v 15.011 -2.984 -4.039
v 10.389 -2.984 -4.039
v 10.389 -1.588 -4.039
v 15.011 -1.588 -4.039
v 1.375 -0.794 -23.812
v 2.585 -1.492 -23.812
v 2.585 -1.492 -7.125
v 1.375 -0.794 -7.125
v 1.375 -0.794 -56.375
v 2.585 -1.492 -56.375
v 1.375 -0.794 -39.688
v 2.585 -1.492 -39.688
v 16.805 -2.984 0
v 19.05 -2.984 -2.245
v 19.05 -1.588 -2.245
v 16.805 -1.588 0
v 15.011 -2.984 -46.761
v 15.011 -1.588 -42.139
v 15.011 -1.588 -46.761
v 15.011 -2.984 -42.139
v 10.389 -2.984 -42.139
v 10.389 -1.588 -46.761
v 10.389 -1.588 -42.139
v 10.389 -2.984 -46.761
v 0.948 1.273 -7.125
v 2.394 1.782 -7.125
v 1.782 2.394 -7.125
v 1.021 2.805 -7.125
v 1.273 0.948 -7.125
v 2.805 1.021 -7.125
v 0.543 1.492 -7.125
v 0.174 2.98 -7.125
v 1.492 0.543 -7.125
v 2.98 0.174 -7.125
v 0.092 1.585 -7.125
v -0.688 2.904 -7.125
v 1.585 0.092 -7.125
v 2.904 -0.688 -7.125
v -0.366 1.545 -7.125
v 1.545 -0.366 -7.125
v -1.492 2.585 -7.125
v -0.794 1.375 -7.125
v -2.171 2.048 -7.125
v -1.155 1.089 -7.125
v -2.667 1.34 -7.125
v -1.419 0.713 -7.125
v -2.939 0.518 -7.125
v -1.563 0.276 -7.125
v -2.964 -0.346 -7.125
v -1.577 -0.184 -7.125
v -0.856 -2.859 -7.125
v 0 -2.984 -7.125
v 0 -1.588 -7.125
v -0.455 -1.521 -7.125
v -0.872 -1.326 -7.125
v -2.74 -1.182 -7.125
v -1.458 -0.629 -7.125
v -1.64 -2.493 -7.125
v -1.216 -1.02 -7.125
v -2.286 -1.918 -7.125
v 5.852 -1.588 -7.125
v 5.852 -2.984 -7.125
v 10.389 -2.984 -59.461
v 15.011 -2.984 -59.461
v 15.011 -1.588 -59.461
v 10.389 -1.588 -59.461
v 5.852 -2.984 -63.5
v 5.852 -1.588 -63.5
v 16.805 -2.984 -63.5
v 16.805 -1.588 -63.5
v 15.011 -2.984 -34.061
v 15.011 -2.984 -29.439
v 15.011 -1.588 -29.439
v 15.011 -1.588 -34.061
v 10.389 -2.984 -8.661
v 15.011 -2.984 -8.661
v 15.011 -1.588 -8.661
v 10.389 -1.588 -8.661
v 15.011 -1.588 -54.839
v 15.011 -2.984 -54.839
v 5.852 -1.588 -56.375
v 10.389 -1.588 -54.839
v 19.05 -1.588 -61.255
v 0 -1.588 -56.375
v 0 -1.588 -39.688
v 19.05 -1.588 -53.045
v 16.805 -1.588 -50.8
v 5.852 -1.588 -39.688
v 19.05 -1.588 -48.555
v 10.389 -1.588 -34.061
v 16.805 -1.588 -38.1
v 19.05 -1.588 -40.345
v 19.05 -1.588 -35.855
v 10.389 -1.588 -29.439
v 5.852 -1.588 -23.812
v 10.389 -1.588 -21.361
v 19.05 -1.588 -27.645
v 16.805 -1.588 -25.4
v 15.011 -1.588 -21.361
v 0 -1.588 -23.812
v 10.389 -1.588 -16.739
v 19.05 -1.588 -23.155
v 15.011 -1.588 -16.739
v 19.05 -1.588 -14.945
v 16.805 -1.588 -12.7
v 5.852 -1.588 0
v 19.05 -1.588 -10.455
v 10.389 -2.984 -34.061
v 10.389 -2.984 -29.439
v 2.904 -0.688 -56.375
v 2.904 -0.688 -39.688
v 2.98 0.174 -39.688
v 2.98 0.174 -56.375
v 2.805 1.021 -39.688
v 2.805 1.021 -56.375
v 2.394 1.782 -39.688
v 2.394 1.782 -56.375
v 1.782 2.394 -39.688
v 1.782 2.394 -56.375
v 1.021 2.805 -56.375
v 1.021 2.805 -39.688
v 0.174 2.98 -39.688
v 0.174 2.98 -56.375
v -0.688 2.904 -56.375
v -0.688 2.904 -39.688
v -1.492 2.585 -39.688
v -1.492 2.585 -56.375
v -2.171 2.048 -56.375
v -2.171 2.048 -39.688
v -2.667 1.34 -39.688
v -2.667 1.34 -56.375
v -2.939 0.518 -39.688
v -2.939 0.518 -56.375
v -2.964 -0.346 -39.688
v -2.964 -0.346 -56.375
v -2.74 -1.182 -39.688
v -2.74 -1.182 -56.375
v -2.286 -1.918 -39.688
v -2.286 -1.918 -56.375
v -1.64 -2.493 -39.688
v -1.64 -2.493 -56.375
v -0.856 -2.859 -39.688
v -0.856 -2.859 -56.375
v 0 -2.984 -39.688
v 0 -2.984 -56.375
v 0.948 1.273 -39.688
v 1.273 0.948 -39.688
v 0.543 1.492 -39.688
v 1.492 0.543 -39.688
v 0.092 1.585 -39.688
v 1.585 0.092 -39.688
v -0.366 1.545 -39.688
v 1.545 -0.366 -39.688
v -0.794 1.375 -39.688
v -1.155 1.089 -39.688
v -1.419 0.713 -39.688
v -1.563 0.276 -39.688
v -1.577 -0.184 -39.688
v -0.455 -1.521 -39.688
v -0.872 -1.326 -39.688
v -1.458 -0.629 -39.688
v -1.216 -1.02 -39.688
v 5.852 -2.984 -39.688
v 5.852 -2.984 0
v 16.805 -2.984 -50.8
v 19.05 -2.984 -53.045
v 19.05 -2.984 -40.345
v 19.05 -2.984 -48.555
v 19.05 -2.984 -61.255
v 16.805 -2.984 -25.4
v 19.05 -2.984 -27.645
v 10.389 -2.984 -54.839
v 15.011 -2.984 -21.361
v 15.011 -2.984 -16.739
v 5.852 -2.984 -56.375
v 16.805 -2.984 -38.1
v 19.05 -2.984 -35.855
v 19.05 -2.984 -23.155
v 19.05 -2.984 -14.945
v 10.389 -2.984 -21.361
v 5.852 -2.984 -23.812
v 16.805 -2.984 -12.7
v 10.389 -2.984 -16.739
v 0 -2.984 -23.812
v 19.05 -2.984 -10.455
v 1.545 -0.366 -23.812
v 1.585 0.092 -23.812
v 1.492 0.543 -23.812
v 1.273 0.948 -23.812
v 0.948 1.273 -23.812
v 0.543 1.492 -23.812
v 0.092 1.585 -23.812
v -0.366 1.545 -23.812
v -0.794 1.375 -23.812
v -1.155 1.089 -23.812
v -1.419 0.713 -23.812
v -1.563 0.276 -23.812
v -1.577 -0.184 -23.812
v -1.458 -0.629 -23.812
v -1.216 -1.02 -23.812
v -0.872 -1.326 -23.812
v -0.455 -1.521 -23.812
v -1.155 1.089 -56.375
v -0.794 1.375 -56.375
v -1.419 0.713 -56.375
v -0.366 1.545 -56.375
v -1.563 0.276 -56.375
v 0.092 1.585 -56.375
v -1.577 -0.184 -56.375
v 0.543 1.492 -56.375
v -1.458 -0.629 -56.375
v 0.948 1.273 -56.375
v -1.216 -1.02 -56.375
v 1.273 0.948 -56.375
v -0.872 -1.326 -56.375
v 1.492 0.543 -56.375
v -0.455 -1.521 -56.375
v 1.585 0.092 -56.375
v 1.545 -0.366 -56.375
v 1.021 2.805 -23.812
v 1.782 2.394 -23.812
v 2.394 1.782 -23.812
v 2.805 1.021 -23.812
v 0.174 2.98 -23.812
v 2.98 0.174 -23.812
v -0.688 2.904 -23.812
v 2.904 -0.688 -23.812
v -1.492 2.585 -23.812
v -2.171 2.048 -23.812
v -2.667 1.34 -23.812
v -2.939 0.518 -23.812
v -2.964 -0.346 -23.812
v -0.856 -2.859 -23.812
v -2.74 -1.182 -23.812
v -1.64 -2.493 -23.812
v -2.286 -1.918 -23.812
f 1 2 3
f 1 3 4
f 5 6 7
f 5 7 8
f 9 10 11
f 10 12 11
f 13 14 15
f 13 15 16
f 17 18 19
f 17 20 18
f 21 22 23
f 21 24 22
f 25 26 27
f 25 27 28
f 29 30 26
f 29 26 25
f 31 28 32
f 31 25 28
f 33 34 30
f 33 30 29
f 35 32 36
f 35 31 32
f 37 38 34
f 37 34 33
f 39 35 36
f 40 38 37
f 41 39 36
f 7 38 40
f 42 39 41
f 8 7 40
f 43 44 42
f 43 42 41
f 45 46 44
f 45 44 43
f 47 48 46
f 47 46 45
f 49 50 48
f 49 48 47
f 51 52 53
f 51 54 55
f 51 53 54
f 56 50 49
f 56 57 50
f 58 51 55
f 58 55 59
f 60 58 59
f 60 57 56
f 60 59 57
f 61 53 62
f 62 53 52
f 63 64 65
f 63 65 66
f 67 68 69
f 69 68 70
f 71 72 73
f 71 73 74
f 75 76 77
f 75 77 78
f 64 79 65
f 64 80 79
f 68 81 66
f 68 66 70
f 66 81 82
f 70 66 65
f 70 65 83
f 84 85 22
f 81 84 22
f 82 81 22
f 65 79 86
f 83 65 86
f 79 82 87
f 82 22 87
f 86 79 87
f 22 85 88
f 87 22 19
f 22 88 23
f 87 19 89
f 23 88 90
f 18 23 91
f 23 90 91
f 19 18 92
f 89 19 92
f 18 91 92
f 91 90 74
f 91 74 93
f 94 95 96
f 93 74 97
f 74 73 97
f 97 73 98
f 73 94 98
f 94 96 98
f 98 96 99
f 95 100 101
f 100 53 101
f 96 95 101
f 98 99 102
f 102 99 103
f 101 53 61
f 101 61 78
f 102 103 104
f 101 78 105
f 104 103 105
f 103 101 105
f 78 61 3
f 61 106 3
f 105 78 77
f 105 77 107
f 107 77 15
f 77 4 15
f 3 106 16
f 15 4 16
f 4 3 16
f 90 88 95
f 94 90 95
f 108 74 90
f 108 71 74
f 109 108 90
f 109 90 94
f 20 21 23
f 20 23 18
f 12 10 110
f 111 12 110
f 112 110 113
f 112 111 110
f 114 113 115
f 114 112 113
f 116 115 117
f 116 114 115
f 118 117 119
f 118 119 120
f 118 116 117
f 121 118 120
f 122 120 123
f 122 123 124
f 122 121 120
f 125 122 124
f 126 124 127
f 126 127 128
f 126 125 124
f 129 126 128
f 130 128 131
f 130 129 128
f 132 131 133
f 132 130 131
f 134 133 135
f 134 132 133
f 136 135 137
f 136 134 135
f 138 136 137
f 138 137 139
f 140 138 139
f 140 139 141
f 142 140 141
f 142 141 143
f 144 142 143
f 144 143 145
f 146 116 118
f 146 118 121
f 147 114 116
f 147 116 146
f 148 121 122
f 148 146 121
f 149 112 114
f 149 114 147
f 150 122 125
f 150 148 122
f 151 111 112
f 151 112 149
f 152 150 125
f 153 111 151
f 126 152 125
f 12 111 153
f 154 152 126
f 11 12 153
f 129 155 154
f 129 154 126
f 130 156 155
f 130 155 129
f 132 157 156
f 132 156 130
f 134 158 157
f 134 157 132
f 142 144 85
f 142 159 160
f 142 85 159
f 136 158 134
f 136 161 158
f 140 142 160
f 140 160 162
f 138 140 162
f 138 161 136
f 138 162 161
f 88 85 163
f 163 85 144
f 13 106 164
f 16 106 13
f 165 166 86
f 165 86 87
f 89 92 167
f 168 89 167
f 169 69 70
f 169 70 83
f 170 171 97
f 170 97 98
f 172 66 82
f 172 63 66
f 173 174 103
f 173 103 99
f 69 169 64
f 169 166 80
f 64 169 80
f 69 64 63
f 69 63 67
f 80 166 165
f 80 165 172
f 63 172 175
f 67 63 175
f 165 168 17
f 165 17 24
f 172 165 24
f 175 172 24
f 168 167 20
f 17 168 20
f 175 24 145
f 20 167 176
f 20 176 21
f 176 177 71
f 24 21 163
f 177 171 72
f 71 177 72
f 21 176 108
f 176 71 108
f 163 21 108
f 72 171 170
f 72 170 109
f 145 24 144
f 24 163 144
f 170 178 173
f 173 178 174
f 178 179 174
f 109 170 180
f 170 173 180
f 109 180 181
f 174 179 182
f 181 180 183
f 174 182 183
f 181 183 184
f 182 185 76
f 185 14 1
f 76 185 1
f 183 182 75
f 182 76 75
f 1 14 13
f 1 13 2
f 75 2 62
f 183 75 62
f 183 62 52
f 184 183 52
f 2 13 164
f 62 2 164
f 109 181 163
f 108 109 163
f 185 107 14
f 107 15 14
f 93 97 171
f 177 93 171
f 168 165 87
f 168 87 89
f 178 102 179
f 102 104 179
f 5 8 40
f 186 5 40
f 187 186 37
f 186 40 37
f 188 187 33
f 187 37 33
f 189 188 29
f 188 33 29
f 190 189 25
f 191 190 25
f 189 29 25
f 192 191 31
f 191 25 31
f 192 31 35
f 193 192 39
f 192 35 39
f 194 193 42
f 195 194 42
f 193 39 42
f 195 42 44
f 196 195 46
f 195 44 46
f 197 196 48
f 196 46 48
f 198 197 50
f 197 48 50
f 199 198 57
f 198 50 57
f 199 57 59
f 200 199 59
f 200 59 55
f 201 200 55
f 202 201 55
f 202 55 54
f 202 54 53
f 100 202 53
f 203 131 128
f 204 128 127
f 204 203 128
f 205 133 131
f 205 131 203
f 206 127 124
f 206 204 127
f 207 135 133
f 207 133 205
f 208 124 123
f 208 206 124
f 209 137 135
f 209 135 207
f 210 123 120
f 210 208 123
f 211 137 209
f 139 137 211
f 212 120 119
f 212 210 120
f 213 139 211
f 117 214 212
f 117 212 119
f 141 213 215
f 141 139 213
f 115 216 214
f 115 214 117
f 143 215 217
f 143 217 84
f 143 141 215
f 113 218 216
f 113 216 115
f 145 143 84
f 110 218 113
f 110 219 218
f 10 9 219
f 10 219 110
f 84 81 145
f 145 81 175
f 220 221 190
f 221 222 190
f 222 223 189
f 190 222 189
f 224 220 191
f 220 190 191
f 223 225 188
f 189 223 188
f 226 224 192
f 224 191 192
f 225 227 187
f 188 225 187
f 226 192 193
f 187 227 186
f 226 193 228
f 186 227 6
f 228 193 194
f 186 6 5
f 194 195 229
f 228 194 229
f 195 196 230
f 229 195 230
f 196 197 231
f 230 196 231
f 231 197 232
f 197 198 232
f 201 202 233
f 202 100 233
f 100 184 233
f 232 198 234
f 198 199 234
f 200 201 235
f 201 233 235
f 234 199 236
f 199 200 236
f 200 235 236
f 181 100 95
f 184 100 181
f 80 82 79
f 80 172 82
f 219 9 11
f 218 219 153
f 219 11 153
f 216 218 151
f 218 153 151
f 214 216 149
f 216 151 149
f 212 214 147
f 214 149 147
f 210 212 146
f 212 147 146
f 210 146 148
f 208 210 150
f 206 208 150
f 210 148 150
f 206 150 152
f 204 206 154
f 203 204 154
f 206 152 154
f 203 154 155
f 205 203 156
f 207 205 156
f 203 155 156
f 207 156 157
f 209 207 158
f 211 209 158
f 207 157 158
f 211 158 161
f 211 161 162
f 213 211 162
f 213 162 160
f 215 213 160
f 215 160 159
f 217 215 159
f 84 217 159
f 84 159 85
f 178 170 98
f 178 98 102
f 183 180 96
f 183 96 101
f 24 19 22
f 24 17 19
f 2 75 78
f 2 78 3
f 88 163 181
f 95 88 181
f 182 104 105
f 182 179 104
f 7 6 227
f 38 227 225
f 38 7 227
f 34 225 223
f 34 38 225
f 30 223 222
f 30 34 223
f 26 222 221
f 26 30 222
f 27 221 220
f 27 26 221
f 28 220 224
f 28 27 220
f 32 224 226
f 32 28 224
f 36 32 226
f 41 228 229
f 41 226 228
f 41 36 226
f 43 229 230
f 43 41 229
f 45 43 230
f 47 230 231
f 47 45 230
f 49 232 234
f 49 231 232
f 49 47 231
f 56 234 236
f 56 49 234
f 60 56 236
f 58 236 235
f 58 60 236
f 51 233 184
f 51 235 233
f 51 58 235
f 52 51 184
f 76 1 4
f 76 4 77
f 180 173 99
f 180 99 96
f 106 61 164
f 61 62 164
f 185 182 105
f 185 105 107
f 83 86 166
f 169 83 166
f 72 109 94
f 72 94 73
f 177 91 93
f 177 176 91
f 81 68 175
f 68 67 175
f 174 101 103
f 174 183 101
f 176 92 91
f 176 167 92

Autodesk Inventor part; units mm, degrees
ref_plane "YZ Plane" through (0, 0, 0) normal (1, 0, 0) x (0, 1, 0)
ref_plane "XZ Plane" through (0, 0, 0) normal (0, 1, 0) x (-1, 0, 0)
ref_plane "XY Plane" through (0, 0, 0) normal (0, 0, 1) x (1, 0, 0)
sketch "Sketch1" plane through (0, 0, 0) normal (0, 0, 1) x (1, 0, 0)
  line L0 (2.5847, -1.4923) -> (1.3748, -0.7938)
  arc A0 (2.5847, -1.4923) -> (0, -2.9845) centre (0, 0) ccw
  arc A1 (1.3748, -0.7938) -> (0, -1.5875) centre (0, 0) ccw
  arc A2 (1.3748, -0.7938) -> (0, -1.5875) centre (0, 0) ccw
  line L1 (0, -1.5875) -> (16.8049, -1.5875)
  line L2 (16.8049, -2.9845) -> (0, -2.9845)
  arc A3 (2.5847, -1.4923) -> (0, -2.9845) centre (0, 0) ccw
  line L3 (2.5847, -1.4923) -> (1.3748, -0.7938)
  line L4 (19.05, -1.5875) -> (16.8049, -1.5875)
  line L5 (19.05, -2.9845) -> (16.8049, -2.9845)
  line L6 (19.05, -1.5875) -> (19.05, -2.9845)
  point P0 (0, 0)
  point P1 (15.875, -2.9845)
extrude "Extrusion1" add sketch "Sketch1" against normal blind 63.5
sketch "Sketch2" plane through (0, -2.9845, 0) normal (0, -1, 0) x (1, 0, 0)
  line L0 (19.05, -23.1549) -> (19.05, -14.9451)
  line L1 (19.05, -14.9451) -> (16.8049, -12.7)
  line L2 (16.8049, -12.7) -> (19.05, -10.4549)
  line L3 (19.05, -10.4549) -> (19.05, -2.2451)
  line L4 (19.05, -2.2451) -> (16.8049, 0)
  line L5 (-2.9845, 0) -> (16.8049, 0)
  line L6 (0, -7.1247) -> (0, 0)
  line L7 (5.8525, -7.1247) -> (-2.9845, -7.1247)
  line L8 (5.8525, -39.6875) -> (5.8525, 0)
  line L9 (5.8525, -23.8125) -> (-2.9845, -23.8125)
  line L10 (0, -39.6875) -> (0, -23.8125)
  line L11 (5.8525, -39.6875) -> (-2.9845, -39.6875)
  line L12 (5.8525, -63.5) -> (5.8525, -39.6875)
  line L13 (-2.9845, -56.3753) -> (5.8525, -56.3753)
  line L14 (0, -63.5) -> (0, -56.3753)
  line L15 (16.8049, -63.5) -> (-2.9845, -63.5)
  line L16 (16.8049, -63.5) -> (19.05, -61.2549)
  line L17 (19.05, -61.2549) -> (19.05, -53.0451)
  line L18 (19.05, -53.0451) -> (16.8049, -50.8)
  line L19 (16.8049, -50.8) -> (19.05, -48.5549)
  line L20 (19.05, -48.5549) -> (19.05, -40.3451)
  line L21 (19.05, -40.3451) -> (16.8049, -38.1)
  line L22 (16.8049, -38.1) -> (19.05, -35.8549)
  line L23 (19.05, -35.8549) -> (19.05, -27.6451)
  line L24 (19.05, -27.6451) -> (16.8049, -25.4)
  line L25 (16.8049, -25.4) -> (19.05, -23.1549)
  line L26 (15.0114, -42.1386) -> (15.0114, -46.7614)
  line L27 (15.0114, -46.7614) -> (10.3886, -46.7614)
  line L28 (10.3886, -46.7614) -> (10.3886, -42.1386)
  line L29 (10.3886, -42.1386) -> (15.0114, -42.1386)
  line L30 (15.0114, -29.4386) -> (15.0114, -34.0614)
  line L31 (15.0114, -34.0614) -> (10.3886, -34.0614)
  line L32 (10.3886, -34.0614) -> (10.3886, -29.4386)
  line L33 (10.3886, -29.4386) -> (15.0114, -29.4386)
  line L34 (15.0114, -16.7386) -> (15.0114, -21.3614)
  line L35 (15.0114, -21.3614) -> (10.3886, -21.3614)
  line L36 (10.3886, -21.3614) -> (10.3886, -16.7386)
  line L37 (10.3886, -16.7386) -> (15.0114, -16.7386)
  line L38 (15.0114, -4.0386) -> (15.0114, -8.6614)
  line L39 (15.0114, -8.6614) -> (10.3886, -8.6614)
  line L40 (10.3886, -8.6614) -> (10.3886, -4.0386)
  line L41 (10.3886, -4.0386) -> (15.0114, -4.0386)
  line L42 (15.0114, -54.8386) -> (15.0114, -59.4614)
  line L43 (15.0114, -59.4614) -> (10.3886, -59.4614)
  line L44 (10.3886, -59.4614) -> (10.3886, -54.8386)
  line L45 (10.3886, -54.8386) -> (15.0114, -54.8386)
  line L46 (-2.9845, 0) -> (-2.9845, -63.5) projected
  line L47 (19.05, -53.0451) -> (19.05, -48.5549)
  line L48 (19.05, -40.3451) -> (19.05, -35.8549)
  line L49 (19.05, -27.6451) -> (19.05, -23.1549)
  line L50 (19.05, -14.9451) -> (19.05, -10.4549)
  line L51 (0, 0) -> (16.8049, 0) projected
  line L52 (16.8049, -63.5) -> (19.05, -63.5)
  line L53 (19.05, -63.5) -> (19.05, -61.2549)
  line L54 (19.05, -2.2451) -> (19.05, 0)
  line L55 (19.05, 0) -> (16.8049, 0)
  line L56 (16.8049, -63.5) -> (19.05, -61.2549)
  line L57 (19.05, -2.2451) -> (16.8049, 0)
  line L58 (0, -63.5) -> (16.8049, -63.5) projected
  line L59 (5.8525, -7.1247) -> (-2.9845, -7.1247)
  line L60 (-2.9845, -7.1247) -> (-2.9845, 0)
  line L61 (-2.9845, 0) -> (5.8525, 0)
  line L62 (5.8525, 0) -> (5.8525, -7.1247)
  point P0 (15.875, -31.75)
extrude "Extrusion2" cut sketch "Sketch2" against normal blind 6.35 contours L49 L24 L25 | L1 L2 L50 | L48 L21 L22 | L4 L55 L54 | L47 L18 L19 | L8 L7 L6 L5 | L6 L7 L46 L5 | L53 L52 L16 | L8 L11 L10 L9 | L10 L11 L46 L9 | L15 L14 L13 L12 | L15 L46 L13 L14 | L26 L27 L28 L29 | L30 L31 L32 L33 | L34 L35 L36 L37 | L38 L39 L40 L41 | L42 L43 L44 L45
sketch "Sketch3" plane through (0, -2.9845, 0) normal (0, -1, 0) x (1, 0, 0)
  line L0 (15.0114, -8.6614) -> (10.3886, -8.6614) projected
  circle A0 centre (12.7, -6.35) radius 2.3114
surface extrude "ExtrusionSrf1" sketch "Sketch3" against normal up to surface (1.397 mm away) shown no curves A0
pattern_linear "Rectangular Pattern1" count 5 spacing 12.7 along (0, 0, -1) of "ExtrusionSrf1"
properties part number "275-1272"
